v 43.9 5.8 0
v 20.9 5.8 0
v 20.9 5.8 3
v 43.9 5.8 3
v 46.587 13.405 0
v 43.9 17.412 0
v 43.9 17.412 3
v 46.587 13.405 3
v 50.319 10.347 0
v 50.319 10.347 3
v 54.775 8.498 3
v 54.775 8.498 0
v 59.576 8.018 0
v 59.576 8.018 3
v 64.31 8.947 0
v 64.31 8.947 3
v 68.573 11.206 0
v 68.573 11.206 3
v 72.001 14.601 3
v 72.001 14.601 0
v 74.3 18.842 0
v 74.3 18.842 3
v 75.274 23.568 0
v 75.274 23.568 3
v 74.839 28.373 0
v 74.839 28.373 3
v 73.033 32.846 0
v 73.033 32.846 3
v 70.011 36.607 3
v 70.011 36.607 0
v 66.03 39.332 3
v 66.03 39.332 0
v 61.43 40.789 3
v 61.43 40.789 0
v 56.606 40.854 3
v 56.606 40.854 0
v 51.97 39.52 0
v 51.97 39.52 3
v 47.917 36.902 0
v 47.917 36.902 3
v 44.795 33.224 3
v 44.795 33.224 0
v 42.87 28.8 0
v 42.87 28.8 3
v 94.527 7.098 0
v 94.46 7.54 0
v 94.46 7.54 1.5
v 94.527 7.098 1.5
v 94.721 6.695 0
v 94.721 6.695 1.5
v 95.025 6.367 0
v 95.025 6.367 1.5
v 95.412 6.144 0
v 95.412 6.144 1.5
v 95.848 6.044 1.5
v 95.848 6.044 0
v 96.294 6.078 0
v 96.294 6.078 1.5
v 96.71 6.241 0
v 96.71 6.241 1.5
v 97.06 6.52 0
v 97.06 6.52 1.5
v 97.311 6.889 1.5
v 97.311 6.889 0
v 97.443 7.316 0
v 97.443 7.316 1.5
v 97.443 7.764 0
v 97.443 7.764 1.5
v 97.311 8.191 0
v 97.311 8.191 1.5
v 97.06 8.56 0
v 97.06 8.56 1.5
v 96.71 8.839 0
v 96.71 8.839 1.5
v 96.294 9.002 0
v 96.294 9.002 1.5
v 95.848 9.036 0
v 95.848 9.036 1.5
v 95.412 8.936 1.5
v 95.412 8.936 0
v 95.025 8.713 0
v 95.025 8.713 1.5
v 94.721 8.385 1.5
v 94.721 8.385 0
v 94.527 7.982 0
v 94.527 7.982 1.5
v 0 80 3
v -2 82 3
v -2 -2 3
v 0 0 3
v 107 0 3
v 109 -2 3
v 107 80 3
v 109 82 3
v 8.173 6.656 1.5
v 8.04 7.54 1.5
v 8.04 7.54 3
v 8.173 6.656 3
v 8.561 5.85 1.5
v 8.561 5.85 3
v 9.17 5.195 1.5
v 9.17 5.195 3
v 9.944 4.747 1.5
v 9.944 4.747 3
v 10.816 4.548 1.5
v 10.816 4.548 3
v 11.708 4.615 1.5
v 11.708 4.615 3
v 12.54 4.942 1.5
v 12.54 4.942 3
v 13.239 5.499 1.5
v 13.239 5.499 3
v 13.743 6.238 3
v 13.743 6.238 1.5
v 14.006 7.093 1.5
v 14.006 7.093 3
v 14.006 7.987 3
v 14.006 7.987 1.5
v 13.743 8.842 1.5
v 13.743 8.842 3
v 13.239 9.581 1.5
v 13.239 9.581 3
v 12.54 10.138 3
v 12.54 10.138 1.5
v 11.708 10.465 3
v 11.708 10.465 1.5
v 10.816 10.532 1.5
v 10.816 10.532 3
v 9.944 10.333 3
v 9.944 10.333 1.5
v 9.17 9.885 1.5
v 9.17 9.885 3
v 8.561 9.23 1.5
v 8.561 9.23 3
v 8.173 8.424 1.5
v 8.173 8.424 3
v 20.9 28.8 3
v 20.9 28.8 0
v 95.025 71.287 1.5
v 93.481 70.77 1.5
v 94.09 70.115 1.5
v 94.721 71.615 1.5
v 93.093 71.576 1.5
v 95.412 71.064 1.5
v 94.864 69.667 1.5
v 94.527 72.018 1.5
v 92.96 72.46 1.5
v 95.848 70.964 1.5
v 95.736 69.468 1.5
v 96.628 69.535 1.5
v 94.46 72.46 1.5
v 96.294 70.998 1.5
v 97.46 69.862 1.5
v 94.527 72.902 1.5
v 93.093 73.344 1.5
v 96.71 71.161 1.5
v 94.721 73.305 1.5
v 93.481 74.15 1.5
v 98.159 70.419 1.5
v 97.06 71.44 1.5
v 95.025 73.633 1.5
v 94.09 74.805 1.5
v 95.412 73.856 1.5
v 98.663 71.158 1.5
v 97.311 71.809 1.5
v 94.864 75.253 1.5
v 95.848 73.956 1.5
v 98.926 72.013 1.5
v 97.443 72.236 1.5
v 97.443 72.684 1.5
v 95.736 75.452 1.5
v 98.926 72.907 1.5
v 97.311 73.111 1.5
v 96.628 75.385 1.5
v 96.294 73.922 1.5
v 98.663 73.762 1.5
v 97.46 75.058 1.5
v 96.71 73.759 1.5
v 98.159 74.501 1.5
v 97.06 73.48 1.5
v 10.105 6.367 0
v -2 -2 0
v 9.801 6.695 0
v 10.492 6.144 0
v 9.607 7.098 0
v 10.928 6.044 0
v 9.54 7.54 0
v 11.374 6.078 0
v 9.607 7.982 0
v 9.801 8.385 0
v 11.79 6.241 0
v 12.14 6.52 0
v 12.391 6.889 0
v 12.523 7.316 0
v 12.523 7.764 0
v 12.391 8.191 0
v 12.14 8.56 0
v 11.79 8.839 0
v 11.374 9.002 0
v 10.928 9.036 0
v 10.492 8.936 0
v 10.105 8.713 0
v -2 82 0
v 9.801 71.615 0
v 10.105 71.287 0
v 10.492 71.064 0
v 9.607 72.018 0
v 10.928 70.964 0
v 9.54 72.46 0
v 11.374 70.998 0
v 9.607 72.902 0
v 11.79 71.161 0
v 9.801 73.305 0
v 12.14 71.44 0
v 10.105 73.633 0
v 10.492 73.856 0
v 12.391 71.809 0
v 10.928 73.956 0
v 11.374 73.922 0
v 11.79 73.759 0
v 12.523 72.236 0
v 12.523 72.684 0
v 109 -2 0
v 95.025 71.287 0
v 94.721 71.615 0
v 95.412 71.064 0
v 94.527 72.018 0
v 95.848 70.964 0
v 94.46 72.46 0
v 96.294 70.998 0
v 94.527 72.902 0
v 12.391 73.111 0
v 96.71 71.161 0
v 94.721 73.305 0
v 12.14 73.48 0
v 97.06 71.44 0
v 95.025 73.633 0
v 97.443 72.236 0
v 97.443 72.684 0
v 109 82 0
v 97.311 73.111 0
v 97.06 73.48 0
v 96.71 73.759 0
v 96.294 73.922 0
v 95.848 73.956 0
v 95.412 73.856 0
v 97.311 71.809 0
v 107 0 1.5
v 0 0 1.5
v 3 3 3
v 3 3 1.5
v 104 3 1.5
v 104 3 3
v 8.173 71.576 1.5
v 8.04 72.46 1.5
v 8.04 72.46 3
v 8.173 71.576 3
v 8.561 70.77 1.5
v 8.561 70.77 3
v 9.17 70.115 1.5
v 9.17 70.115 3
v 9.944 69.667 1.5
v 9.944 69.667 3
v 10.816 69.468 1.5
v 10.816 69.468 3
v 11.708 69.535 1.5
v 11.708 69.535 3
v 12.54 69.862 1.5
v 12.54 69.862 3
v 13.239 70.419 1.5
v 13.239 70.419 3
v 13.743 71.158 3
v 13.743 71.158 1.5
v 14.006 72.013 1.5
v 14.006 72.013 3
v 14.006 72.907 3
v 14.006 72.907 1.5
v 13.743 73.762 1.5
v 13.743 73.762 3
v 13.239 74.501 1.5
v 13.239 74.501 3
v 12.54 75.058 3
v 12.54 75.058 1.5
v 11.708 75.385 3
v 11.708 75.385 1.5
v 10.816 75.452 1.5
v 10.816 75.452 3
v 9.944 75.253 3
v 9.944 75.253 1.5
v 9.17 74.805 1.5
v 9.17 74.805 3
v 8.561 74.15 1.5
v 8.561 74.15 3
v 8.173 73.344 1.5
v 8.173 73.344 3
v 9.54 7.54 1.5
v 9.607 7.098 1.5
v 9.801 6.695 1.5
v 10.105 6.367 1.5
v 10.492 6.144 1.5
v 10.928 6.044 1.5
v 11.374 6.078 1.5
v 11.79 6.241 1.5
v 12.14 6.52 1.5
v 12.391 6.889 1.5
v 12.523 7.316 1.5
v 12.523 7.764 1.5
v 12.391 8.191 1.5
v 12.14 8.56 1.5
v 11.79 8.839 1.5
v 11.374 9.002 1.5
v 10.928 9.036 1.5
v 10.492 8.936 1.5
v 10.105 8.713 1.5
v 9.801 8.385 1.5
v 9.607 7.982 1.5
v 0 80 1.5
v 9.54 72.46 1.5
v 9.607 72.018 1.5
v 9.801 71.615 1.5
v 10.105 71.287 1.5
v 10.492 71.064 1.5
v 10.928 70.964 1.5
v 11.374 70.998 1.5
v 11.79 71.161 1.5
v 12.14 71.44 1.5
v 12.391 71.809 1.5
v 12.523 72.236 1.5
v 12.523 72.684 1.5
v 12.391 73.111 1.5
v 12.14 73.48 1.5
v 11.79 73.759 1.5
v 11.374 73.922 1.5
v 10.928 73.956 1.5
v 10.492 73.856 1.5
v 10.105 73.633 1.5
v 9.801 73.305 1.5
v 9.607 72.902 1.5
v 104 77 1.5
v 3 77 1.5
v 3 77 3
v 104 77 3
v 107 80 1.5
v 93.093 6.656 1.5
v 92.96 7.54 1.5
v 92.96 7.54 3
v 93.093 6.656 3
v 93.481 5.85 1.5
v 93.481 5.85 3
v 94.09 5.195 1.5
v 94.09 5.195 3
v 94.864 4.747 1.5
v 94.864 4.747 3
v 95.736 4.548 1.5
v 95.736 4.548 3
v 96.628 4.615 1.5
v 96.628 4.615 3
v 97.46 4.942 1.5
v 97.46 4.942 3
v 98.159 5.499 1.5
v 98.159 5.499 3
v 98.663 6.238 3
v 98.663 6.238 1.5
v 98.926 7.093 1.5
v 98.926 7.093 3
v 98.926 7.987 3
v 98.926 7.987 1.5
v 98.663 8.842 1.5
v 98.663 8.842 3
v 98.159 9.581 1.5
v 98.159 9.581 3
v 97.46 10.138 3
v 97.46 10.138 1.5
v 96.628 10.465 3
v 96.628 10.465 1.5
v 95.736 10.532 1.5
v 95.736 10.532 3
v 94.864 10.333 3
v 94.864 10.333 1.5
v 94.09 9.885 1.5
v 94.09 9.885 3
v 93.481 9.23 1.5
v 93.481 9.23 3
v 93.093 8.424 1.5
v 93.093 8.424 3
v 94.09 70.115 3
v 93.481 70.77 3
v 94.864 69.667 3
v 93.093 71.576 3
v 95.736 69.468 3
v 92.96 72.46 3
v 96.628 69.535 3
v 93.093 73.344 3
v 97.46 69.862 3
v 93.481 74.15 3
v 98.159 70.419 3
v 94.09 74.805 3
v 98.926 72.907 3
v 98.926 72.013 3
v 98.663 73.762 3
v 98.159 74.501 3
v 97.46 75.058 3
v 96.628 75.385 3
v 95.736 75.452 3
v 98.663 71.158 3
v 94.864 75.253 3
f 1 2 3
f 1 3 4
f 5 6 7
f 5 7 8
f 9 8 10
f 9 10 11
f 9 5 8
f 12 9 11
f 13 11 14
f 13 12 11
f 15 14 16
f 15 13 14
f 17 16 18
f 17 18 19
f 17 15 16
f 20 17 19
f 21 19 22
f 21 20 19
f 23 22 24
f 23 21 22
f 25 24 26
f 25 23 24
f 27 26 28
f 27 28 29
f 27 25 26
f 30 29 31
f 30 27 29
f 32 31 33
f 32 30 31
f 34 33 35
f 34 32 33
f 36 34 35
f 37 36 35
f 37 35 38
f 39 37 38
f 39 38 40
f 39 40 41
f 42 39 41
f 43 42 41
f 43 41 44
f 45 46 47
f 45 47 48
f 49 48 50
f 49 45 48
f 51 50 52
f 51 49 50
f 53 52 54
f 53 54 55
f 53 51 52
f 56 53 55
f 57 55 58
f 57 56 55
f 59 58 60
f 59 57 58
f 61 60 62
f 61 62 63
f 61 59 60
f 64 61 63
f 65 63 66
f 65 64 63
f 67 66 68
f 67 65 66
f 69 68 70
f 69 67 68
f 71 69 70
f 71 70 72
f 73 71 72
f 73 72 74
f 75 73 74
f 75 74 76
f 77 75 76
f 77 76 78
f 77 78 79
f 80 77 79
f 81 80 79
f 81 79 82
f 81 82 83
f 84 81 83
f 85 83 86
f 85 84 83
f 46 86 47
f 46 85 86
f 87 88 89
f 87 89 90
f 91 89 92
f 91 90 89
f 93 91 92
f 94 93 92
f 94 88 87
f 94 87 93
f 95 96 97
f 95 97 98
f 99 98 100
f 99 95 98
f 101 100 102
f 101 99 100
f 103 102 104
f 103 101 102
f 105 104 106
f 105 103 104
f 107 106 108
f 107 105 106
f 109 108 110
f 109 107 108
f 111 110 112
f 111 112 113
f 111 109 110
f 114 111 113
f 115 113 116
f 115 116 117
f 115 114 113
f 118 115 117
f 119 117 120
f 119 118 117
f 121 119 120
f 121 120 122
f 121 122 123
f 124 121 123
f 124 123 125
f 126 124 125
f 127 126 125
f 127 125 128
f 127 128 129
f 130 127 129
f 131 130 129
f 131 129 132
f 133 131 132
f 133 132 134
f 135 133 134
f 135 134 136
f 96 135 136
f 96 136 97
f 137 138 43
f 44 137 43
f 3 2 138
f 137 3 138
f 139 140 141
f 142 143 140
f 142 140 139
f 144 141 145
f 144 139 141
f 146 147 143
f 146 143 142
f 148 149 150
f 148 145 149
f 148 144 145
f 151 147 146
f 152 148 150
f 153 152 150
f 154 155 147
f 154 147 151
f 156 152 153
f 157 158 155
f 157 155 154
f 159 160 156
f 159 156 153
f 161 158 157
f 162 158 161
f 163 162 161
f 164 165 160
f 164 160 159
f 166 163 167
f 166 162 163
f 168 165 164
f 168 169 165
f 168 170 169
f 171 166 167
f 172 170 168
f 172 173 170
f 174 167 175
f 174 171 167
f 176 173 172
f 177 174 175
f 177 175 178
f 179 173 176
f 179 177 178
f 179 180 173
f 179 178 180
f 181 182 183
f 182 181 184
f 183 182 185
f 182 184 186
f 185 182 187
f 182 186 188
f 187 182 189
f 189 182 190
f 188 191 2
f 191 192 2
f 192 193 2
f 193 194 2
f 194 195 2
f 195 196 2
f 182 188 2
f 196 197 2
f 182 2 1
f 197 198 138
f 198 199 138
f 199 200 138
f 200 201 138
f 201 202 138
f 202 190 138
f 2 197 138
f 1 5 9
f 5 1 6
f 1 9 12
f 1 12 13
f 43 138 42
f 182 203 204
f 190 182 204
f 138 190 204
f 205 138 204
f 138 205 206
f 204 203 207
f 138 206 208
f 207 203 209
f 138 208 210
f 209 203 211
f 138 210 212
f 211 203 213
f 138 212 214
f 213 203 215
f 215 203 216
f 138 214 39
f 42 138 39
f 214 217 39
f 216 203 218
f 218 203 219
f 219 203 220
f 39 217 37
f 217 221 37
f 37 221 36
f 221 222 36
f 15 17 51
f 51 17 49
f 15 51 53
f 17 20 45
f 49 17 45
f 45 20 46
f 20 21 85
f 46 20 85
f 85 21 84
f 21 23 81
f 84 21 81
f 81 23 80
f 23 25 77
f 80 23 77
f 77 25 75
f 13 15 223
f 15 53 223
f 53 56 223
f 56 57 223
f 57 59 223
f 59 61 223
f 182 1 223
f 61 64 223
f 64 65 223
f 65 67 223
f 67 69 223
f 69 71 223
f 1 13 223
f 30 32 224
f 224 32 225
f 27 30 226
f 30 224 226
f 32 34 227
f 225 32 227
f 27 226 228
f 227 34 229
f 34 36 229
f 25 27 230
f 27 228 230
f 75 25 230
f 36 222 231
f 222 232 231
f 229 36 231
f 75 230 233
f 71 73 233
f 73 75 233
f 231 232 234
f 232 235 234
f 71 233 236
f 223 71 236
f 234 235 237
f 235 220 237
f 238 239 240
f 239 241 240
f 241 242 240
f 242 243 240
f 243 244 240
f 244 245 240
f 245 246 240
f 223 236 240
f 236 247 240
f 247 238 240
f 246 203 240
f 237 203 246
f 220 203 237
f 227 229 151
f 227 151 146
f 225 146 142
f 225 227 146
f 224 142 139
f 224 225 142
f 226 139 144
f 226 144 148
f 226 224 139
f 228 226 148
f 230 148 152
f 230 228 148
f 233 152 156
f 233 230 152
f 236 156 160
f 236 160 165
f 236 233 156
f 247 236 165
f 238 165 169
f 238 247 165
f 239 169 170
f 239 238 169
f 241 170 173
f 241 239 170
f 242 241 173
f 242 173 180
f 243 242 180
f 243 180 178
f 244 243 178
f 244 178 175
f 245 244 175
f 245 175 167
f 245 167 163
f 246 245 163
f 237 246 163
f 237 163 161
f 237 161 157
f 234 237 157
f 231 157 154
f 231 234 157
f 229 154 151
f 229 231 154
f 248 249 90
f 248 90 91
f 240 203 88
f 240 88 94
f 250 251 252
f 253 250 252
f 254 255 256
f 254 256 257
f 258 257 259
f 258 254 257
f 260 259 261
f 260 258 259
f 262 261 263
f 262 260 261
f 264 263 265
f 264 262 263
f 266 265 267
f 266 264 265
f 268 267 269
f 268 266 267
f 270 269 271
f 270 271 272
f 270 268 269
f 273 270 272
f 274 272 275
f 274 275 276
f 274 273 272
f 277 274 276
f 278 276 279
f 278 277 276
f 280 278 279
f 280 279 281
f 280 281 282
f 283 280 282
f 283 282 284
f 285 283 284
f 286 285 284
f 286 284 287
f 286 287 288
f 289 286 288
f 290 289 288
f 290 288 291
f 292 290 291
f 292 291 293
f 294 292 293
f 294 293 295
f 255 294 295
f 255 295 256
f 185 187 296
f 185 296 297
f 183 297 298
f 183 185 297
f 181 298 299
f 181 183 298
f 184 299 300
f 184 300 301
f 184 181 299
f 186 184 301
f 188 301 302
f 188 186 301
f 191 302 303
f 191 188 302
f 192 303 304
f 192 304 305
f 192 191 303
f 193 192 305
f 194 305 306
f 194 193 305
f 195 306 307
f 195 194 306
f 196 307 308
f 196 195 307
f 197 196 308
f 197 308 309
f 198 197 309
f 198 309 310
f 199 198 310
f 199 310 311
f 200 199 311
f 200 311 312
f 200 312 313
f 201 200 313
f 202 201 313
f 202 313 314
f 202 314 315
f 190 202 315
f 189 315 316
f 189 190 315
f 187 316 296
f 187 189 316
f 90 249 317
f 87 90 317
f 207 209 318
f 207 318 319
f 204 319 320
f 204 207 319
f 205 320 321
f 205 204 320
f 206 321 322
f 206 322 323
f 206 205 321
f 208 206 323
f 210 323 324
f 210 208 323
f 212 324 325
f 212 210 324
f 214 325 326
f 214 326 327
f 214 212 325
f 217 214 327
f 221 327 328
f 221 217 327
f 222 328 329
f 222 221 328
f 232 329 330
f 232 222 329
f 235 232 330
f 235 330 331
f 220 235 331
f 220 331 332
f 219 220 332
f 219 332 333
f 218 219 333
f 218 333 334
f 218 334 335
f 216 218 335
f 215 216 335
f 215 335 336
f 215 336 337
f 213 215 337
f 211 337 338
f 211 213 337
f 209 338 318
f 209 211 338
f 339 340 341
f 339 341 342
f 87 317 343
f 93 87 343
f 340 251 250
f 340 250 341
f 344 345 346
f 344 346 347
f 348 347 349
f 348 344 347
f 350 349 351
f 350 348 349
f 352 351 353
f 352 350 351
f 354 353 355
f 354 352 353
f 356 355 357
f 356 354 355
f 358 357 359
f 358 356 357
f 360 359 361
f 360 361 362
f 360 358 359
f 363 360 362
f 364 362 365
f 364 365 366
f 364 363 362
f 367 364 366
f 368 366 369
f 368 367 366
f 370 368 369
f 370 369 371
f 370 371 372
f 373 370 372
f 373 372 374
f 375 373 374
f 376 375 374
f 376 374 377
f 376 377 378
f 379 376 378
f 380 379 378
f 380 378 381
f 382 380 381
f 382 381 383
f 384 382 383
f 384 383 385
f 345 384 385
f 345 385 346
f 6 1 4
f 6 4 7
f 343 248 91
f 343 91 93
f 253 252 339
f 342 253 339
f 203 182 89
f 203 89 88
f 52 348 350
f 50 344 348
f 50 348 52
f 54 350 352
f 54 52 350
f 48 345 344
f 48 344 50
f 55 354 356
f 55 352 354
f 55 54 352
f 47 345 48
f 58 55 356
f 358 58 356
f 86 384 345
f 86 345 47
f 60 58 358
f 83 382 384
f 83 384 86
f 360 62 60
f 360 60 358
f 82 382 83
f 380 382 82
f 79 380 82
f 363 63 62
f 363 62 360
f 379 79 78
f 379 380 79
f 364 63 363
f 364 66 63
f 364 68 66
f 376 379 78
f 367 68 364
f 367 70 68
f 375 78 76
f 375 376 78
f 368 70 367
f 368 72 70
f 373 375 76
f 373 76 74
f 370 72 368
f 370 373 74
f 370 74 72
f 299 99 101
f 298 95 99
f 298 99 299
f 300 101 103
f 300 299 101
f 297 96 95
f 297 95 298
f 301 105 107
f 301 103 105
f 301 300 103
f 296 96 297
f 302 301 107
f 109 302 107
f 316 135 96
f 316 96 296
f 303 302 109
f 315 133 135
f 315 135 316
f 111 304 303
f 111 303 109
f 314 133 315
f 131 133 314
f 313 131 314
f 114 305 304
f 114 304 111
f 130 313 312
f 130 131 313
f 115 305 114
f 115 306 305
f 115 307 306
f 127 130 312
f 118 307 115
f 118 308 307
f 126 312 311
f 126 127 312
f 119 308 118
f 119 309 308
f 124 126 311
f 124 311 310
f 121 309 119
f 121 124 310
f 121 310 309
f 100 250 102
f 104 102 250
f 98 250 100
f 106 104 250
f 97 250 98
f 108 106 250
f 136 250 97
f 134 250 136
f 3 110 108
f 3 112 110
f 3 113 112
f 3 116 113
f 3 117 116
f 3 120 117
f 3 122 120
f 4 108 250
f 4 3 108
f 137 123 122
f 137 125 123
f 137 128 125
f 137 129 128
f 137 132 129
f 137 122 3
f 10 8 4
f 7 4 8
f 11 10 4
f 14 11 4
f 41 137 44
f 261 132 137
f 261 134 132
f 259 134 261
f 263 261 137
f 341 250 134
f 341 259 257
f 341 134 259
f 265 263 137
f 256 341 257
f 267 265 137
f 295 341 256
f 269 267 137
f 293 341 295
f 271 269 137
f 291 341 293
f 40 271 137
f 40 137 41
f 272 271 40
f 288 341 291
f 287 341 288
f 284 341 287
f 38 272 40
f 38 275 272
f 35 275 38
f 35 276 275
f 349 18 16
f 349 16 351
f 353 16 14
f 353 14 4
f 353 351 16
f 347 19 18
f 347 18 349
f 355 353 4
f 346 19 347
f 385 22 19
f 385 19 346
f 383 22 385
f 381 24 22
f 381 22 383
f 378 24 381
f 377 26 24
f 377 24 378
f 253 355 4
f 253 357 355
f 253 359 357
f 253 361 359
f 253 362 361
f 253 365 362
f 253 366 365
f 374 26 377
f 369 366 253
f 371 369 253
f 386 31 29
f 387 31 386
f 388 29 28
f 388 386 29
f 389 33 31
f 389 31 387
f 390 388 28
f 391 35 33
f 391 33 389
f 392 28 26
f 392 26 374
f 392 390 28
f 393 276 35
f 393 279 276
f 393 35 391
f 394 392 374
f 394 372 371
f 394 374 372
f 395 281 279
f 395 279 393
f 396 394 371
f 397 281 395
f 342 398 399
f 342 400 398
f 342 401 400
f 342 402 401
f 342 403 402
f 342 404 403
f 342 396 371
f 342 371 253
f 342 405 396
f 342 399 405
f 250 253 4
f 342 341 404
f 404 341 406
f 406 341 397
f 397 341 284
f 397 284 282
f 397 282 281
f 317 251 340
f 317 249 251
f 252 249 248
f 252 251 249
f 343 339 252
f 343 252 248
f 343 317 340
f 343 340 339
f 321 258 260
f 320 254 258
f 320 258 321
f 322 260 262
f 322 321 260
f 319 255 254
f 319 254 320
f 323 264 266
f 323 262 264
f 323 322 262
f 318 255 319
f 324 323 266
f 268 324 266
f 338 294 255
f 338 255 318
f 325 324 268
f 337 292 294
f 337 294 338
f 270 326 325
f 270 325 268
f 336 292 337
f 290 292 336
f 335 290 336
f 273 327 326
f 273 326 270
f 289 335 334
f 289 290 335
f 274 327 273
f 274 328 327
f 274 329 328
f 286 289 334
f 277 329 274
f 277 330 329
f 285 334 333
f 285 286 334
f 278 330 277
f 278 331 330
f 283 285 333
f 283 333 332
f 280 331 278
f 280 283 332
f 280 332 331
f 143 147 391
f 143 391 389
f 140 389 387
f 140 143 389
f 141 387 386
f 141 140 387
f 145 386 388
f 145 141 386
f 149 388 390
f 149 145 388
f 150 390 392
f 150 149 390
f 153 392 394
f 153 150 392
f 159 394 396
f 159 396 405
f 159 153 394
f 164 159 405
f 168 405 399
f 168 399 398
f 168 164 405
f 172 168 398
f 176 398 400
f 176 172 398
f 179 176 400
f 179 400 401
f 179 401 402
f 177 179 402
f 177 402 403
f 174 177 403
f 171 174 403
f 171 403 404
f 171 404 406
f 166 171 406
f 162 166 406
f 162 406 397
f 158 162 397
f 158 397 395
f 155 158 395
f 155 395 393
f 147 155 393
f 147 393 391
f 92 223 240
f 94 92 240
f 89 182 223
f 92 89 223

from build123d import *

# Parameters (mm, degrees)
SKETCH_9_W                                     = 111
SKETCH_9_H                                     = 84
BOTTOM_BASE_1P5MM_FULL_111X84_DEPTH            = 1.5
SKETCH_10_W                                    = 101
SKETCH_10_H                                    = 74
SKETCH_10_R                                    = 3
BOTTOM_CENTER_FULL_THICKNESS_EXCEPT_STAN_DEPTH = 3
SKETCH_11_W                                    = 111
SKETCH_11_H                                    = 2
BOTTOM_OUTER_FRONT_OVERHANG_FULL_3MM_DEPTH     = 3
SKETCH_12_W                                    = 111
SKETCH_12_H                                    = 2
BOTTOM_OUTER_REAR_OVERHANG_FULL_3MM_DEPTH      = 3
SKETCH_13_W                                    = 2
SKETCH_13_H                                    = 80
BOTTOM_OUTER_LEFT_OVERHANG_FULL_3MM_DEPTH      = 3
SKETCH_14_W                                    = 2
SKETCH_14_H                                    = 80
BOTTOM_OUTER_RIGHT_OVERHANG_FULL_3MM_DEPTH     = 3
SKETCH_16_R                                    = 1.5
BOTTOM_M3_THROUGH_3MM_DEPTH                    = 1.5
SKETCH_18_R                                    = 16.5
BOTTOM_BATTERY_THROUGH_CLEARANCE_DEPTH         = 3
SKETCH_20_W                                    = 23
SKETCH_20_H                                    = 23
BOTTOM_BUZZER_THROUGH_CUT_DEPTH                = 3


with BuildPart() as part:
    # Sketch 9 → bottom_base_1p5mm_full_111x84 (new body)
    with BuildSketch(Plane.XY):
        with Locations((53.5, 40)):
            Rectangle(SKETCH_9_W, SKETCH_9_H)
    extrude(amount=BOTTOM_BASE_1P5MM_FULL_111X84_DEPTH)

    # Sketch 10 → bottom_center_full_thickness_except_stan (add)
    with BuildSketch(Plane.XY):
        with Locations((53.5, 40)):
            Rectangle(SKETCH_10_W, SKETCH_10_H)
        with Locations(Location((11.04, 7.54, 0), (0, 0, 180))):
            Circle(SKETCH_10_R, mode=Mode.SUBTRACT)
        with Locations(Location((95.96, 7.54, 0), (0, 0, 180))):
            Circle(SKETCH_10_R, mode=Mode.SUBTRACT)
        with Locations(Location((11.04, 72.46, 0), (0, 0, 180))):
            Circle(SKETCH_10_R, mode=Mode.SUBTRACT)
        with Locations(Location((95.96, 72.46, 0), (0, 0, 180))):
            Circle(SKETCH_10_R, mode=Mode.SUBTRACT)
    extrude(amount=BOTTOM_CENTER_FULL_THICKNESS_EXCEPT_STAN_DEPTH)

    # Sketch 11 → bottom_outer_front_overhang_full_3mm (add)
    with BuildSketch(Plane.XY):
        with Locations((53.5, -1)):
            Rectangle(SKETCH_11_W, SKETCH_11_H)
    extrude(amount=BOTTOM_OUTER_FRONT_OVERHANG_FULL_3MM_DEPTH)

    # Sketch 12 → bottom_outer_rear_overhang_full_3mm (add)
    with BuildSketch(Plane.XY):
        with Locations((53.5, 81)):
            Rectangle(SKETCH_12_W, SKETCH_12_H)
    extrude(amount=BOTTOM_OUTER_REAR_OVERHANG_FULL_3MM_DEPTH)

    # Sketch 13 → bottom_outer_left_overhang_full_3mm (add)
    with BuildSketch(Plane.XY):
        with Locations((-1, 40)):
            Rectangle(SKETCH_13_W, SKETCH_13_H)
    extrude(amount=BOTTOM_OUTER_LEFT_OVERHANG_FULL_3MM_DEPTH)

    # Sketch 14 → bottom_outer_right_overhang_full_3mm (add)
    with BuildSketch(Plane.XY):
        with Locations((108, 40)):
            Rectangle(SKETCH_14_W, SKETCH_14_H)
    extrude(amount=BOTTOM_OUTER_RIGHT_OVERHANG_FULL_3MM_DEPTH)

    # Sketch 16 → bottom_m3_through_3mm (cut)
    with BuildSketch(Plane.XY):
        with Locations(Location((11.04, 7.54, 0), (0, 0, 180))):
            Circle(SKETCH_16_R)
        with Locations(Location((95.96, 7.54, 0), (0, 0, 180))):
            Circle(SKETCH_16_R)
        with Locations(Location((11.04, 72.46, 0), (0, 0, 180))):
            Circle(SKETCH_16_R)
        with Locations(Location((95.96, 72.46, 0), (0, 0, 180))):
            Circle(SKETCH_16_R)
    extrude(amount=BOTTOM_M3_THROUGH_3MM_DEPTH, mode=Mode.SUBTRACT)

    # Sketch 18 → bottom_battery_through_clearance (cut)
    with BuildSketch(Plane.XY):
        with Locations(Location((58.8, 24.5, 0), (0, 0, 180))):
            Circle(SKETCH_18_R)
    extrude(amount=BOTTOM_BATTERY_THROUGH_CLEARANCE_DEPTH, mode=Mode.SUBTRACT)

    # Sketch 20 → bottom_buzzer_through_cut (cut)
    with BuildSketch(Plane.XY):
        with Locations((32.4, 17.3)):
            Rectangle(SKETCH_20_W, SKETCH_20_H)
    extrude(amount=BOTTOM_BUZZER_THROUGH_CUT_DEPTH, mode=Mode.SUBTRACT)


solid = part.part
